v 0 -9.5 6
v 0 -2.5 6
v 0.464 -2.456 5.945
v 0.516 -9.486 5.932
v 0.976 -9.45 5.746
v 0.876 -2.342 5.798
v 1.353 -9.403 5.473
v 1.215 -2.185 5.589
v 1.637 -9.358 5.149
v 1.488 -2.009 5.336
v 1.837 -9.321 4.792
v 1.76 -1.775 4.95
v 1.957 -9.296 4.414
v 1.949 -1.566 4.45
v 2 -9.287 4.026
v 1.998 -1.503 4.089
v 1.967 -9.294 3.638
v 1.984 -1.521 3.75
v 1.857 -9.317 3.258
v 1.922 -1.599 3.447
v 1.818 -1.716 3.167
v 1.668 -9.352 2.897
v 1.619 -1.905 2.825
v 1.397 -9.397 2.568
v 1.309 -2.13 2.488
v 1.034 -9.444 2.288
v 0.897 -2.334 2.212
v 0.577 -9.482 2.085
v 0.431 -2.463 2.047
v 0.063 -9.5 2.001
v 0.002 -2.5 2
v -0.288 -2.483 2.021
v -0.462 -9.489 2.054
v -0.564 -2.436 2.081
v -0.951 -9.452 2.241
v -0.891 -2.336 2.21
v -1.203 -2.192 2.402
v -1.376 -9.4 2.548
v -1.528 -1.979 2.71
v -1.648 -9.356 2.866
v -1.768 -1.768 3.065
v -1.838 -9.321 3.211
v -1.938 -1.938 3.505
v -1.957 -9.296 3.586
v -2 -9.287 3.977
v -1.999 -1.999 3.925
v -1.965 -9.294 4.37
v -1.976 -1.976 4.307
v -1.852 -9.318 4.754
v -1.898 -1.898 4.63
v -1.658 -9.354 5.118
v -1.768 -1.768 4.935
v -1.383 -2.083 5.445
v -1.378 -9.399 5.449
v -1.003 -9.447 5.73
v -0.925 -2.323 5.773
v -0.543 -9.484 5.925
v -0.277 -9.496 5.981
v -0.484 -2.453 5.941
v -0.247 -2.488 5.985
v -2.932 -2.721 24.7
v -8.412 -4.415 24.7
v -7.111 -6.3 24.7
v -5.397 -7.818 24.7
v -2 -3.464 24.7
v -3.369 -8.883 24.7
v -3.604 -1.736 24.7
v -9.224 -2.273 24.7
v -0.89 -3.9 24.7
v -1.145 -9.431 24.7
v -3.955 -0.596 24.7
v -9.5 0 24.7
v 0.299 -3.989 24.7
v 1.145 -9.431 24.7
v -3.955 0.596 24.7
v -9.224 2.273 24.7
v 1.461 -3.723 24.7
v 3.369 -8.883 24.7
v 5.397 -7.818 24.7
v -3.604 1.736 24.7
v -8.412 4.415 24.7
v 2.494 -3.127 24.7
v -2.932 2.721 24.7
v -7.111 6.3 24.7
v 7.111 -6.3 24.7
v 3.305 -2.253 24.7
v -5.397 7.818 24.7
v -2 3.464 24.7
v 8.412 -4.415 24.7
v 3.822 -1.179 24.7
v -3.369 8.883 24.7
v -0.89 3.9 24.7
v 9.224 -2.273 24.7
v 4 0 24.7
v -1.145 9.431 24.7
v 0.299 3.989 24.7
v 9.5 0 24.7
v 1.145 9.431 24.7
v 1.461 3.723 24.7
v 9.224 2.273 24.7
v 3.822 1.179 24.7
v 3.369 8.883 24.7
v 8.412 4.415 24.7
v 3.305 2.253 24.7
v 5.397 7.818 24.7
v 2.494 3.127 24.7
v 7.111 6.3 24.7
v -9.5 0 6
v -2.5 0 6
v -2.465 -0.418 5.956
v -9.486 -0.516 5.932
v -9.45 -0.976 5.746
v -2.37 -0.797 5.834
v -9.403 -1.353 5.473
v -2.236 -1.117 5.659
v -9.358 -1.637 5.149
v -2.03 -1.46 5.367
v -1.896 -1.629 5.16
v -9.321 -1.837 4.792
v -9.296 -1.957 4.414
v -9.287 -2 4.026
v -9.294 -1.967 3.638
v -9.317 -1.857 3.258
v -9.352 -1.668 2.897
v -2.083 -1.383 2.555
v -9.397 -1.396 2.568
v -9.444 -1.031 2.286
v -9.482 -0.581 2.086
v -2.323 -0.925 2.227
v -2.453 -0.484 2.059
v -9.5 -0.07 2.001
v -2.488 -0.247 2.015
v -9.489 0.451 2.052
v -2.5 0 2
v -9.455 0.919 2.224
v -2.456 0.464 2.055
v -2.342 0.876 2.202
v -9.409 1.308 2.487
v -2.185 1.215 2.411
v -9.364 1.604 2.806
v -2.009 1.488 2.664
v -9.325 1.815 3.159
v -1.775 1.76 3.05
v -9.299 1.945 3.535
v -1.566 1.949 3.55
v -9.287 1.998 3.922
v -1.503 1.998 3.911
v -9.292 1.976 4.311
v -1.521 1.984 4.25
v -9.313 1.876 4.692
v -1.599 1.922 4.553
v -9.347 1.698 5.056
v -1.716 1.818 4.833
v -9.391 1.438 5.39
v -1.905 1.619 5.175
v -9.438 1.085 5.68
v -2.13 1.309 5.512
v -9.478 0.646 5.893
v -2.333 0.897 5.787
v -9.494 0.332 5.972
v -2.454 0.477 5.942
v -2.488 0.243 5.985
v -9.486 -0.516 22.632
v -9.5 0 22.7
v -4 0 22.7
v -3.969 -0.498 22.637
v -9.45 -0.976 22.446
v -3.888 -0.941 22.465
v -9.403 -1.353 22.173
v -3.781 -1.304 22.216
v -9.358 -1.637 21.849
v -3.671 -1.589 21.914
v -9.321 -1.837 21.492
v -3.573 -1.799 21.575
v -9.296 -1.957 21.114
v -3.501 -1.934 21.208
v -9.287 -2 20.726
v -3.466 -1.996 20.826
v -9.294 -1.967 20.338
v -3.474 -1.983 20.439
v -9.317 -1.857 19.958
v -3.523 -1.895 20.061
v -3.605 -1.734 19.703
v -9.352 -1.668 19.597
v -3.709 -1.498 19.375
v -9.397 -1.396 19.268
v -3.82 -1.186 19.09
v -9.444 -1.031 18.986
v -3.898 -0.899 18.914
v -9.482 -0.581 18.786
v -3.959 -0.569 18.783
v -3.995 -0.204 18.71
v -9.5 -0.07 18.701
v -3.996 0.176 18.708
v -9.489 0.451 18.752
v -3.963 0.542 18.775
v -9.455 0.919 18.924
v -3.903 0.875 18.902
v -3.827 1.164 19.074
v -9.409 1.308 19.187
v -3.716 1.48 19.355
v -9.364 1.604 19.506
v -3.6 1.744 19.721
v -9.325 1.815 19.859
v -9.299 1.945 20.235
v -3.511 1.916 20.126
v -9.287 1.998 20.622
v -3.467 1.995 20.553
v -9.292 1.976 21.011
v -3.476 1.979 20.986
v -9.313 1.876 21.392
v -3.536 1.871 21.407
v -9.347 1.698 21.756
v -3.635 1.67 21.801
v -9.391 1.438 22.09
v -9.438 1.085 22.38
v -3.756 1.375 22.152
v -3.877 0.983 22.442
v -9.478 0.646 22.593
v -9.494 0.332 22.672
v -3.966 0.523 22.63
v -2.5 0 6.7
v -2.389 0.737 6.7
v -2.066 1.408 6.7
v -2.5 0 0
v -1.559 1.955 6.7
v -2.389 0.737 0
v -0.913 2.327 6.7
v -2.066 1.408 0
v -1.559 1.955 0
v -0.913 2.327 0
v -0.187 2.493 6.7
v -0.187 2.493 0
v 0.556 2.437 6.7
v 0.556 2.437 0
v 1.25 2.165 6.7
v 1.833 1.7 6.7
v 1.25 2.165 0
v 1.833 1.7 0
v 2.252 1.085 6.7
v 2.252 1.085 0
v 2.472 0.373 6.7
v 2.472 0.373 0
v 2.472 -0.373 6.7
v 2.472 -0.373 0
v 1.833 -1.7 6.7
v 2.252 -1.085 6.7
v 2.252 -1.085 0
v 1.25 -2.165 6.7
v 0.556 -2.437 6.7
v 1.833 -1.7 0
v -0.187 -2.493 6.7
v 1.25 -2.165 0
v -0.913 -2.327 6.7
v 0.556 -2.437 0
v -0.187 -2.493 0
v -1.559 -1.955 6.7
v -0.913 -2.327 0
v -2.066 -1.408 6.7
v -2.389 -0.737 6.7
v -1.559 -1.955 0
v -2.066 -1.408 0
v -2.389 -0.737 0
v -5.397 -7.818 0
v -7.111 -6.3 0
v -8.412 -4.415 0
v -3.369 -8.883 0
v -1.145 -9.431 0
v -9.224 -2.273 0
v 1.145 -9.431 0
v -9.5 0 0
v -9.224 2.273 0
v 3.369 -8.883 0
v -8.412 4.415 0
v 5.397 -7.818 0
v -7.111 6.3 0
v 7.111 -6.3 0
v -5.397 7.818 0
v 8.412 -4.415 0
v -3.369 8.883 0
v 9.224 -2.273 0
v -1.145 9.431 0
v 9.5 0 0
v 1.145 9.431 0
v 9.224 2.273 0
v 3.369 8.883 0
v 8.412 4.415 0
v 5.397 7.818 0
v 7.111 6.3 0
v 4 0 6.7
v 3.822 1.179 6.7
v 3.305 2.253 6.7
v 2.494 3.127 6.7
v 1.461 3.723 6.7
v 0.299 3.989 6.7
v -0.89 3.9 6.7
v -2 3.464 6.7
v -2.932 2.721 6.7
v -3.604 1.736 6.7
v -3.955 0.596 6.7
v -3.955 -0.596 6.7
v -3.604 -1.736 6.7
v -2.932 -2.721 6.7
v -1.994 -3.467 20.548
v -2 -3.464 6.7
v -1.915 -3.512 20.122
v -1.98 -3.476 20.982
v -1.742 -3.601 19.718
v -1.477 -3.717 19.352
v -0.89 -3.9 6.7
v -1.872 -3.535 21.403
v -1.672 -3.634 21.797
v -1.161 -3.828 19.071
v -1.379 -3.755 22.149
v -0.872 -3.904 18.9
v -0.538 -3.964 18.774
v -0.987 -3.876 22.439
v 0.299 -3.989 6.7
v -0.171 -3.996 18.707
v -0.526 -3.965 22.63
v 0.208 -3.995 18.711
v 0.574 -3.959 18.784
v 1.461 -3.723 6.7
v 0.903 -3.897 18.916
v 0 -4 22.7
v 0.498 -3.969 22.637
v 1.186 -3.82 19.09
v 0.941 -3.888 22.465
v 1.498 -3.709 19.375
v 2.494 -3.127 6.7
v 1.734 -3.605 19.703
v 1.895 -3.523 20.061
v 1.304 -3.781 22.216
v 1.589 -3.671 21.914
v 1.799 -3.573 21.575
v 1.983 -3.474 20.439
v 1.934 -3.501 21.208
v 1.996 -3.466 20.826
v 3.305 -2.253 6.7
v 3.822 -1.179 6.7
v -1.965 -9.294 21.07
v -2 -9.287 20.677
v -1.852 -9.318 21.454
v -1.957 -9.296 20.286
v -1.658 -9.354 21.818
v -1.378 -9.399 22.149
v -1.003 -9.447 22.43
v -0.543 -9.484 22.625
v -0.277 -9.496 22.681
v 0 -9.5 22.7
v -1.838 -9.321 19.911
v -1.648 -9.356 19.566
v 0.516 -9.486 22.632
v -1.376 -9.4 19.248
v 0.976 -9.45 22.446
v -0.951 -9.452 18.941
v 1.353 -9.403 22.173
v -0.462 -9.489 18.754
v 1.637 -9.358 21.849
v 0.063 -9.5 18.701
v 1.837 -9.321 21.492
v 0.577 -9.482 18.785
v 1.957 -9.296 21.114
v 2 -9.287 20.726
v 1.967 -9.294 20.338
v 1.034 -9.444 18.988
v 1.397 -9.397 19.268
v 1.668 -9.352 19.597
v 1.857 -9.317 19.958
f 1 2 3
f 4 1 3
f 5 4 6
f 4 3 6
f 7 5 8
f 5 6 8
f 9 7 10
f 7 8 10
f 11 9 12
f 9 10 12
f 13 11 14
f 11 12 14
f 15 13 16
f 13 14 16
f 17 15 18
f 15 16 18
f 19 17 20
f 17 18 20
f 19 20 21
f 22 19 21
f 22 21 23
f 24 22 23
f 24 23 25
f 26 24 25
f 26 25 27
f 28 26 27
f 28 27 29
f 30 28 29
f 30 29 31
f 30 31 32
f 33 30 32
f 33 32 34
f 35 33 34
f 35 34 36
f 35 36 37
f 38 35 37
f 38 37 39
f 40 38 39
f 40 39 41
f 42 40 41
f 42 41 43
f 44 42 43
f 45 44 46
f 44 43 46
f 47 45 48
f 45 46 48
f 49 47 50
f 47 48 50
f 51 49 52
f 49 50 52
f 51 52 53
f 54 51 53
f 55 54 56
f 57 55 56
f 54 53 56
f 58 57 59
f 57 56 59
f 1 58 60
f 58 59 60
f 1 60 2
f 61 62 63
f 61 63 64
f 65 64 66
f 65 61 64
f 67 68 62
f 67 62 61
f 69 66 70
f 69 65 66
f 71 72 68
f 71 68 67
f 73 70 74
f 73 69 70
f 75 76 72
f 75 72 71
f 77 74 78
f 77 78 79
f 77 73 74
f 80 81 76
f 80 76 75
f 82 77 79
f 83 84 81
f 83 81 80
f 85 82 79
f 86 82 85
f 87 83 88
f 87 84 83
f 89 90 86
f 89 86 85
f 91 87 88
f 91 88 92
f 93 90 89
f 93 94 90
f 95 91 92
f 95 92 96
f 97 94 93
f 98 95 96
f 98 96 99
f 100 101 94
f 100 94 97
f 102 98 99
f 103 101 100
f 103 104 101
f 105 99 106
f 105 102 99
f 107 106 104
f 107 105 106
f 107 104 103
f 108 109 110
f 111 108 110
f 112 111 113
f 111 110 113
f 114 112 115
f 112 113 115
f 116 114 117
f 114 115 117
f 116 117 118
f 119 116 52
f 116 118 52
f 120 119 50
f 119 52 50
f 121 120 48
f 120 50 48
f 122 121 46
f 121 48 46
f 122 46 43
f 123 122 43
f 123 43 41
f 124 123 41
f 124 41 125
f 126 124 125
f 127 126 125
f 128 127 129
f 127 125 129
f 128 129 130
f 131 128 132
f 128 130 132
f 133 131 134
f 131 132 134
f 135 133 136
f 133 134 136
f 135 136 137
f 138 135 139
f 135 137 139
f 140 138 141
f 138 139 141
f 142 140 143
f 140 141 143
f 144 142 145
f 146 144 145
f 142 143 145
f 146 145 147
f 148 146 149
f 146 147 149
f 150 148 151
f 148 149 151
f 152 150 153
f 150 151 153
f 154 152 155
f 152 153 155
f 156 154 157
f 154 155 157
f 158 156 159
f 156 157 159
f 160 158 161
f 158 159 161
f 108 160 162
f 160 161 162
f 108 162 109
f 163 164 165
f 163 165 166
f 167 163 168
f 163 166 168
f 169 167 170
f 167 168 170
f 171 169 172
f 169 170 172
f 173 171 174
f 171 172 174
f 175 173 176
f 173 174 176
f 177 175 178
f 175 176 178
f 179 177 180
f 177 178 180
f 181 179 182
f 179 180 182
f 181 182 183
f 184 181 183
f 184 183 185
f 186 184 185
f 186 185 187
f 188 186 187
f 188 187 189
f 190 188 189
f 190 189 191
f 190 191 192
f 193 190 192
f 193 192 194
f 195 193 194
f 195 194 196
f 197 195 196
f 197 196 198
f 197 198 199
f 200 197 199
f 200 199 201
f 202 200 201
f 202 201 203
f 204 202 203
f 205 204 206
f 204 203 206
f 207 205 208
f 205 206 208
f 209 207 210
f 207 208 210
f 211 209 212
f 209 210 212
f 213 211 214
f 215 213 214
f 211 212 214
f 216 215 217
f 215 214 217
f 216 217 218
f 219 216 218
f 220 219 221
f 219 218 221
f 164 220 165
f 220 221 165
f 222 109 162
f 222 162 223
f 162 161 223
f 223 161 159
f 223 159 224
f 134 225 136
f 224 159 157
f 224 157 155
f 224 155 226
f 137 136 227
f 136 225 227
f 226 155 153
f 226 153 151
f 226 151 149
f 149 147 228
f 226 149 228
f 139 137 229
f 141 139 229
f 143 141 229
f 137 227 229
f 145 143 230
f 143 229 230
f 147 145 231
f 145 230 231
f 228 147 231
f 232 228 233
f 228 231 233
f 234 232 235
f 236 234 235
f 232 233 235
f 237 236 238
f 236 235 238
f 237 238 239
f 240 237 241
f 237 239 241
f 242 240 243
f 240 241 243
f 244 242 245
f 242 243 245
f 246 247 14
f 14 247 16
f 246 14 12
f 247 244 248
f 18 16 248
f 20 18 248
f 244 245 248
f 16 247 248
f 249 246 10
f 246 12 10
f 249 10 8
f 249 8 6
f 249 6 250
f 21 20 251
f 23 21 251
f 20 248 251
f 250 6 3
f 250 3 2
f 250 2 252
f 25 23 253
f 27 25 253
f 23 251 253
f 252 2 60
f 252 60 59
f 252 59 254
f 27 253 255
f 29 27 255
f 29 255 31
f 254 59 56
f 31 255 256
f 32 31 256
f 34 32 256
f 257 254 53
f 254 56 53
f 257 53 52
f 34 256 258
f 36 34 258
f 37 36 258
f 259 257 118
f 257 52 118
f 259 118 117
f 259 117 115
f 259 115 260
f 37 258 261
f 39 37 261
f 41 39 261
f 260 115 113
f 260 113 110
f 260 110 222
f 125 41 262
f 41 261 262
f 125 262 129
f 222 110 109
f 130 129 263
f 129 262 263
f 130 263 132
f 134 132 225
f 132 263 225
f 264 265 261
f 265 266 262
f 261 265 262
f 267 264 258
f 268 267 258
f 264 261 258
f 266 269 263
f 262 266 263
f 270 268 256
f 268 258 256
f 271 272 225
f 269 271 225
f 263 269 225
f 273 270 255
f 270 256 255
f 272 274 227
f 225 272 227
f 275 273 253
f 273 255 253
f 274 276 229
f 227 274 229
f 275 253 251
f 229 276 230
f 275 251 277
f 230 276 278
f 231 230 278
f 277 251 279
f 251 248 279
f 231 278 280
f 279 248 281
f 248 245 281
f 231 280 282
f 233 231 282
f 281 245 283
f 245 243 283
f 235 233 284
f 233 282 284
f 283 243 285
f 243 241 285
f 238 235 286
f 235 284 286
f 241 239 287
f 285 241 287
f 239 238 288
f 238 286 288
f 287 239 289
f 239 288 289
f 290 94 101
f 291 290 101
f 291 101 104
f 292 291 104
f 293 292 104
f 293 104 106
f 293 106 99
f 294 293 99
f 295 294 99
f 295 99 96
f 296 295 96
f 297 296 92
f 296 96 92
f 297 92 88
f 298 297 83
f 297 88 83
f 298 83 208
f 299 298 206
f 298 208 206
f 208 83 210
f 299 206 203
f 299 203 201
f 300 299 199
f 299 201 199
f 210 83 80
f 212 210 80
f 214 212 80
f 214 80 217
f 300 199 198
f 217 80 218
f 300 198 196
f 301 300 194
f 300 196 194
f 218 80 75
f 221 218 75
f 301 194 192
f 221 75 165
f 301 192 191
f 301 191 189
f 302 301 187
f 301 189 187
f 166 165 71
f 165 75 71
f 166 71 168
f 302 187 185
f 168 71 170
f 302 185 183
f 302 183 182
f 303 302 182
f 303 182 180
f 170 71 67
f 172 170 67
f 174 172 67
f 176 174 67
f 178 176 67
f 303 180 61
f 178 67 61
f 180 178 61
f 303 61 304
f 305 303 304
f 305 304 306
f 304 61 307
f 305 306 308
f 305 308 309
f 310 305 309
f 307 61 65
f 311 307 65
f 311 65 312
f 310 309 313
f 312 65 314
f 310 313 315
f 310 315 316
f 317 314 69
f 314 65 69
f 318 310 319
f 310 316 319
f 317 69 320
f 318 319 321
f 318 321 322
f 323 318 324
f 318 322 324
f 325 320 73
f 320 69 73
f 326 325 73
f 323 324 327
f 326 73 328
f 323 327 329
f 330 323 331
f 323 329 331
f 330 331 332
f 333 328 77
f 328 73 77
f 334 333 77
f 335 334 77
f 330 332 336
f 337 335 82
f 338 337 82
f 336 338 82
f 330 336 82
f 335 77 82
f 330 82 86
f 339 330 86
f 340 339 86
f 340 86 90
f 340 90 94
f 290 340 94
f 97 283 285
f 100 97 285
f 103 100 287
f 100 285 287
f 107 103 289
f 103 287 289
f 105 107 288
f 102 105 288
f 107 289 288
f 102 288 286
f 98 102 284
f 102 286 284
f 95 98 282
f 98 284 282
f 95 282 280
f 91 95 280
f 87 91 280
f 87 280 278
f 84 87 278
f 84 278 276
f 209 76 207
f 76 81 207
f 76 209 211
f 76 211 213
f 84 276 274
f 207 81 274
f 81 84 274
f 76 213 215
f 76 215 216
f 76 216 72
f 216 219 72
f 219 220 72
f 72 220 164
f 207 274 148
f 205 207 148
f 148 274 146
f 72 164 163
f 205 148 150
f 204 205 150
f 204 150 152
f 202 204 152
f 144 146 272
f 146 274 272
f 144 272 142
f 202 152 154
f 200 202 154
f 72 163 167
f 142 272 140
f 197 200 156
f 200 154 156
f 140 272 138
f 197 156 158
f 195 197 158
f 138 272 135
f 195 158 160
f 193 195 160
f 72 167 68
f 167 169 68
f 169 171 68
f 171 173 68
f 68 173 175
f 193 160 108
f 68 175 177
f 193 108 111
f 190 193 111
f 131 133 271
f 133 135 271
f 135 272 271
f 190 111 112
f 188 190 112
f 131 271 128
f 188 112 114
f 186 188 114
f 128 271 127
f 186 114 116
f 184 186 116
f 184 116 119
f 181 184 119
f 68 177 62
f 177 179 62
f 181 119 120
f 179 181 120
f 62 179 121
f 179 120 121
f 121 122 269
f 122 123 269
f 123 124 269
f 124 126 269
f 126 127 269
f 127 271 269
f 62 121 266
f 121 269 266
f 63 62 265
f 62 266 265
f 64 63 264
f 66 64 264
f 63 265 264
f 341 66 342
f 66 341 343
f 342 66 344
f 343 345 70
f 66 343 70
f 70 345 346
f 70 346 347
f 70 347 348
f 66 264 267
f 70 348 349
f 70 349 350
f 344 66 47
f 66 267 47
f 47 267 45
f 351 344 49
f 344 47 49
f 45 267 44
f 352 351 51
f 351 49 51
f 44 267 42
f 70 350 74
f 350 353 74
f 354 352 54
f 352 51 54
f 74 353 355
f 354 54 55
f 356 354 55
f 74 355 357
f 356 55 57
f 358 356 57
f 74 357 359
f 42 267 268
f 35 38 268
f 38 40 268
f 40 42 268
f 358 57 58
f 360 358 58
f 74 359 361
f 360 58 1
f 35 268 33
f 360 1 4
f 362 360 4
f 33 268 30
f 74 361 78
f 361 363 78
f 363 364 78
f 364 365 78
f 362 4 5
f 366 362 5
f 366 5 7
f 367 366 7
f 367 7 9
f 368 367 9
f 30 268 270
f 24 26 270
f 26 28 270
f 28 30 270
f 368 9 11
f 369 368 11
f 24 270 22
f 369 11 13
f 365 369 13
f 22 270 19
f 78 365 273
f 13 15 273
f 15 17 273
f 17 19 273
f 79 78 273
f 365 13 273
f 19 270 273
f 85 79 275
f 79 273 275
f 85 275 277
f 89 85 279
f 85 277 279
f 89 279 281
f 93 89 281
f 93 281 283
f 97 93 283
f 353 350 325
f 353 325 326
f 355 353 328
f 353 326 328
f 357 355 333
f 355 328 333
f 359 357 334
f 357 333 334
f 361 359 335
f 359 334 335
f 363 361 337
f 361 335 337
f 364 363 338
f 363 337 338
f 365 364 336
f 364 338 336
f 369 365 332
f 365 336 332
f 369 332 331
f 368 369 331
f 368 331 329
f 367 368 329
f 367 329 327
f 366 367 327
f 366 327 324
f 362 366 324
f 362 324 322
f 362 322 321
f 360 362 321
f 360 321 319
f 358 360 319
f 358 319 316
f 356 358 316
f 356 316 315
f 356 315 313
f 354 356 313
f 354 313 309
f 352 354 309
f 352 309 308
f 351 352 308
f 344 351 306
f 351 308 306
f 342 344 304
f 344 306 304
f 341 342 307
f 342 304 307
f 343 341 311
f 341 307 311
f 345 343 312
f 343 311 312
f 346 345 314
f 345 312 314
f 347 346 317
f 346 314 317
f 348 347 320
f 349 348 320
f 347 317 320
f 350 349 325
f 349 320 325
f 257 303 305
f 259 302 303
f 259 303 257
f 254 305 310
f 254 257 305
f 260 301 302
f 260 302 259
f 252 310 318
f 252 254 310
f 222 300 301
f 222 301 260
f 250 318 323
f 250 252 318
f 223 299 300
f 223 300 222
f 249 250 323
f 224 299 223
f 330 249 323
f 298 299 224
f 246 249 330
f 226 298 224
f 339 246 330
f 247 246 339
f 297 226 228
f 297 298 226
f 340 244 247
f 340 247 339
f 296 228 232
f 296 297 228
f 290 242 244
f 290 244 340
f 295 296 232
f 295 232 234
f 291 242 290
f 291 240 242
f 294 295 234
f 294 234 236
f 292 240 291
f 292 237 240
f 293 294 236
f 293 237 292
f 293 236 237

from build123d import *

# Parameters (mm, degrees)
ESQUISSE1_R                  = 9.5
BOSS_EXTRU_1_DEPTH           = 24.7
ESQUISSE2_R                  = 4
ENL_V_MAT_EXTRU_1_DEPTH      = 18
ESQUISSE3_R                  = 2.5
ENL_V_MAT_EXTRU_2_DEPTH      = 29.117432315
ESQUISSE4_R                  = 2
ENL_V_MAT_EXTRU_3_DEPTH      = 29.117432315
R_P_TITION_CIRCULAIRE1_COUNT = 2
R_P_TITION_CIRCULAIRE1_ANGLE = 90


with BuildPart() as part:
    # Esquisse1 → Boss.-Extru.1 (new body)
    with BuildSketch(Plane.XY):
        Circle(ESQUISSE1_R)
    extrude(amount=BOSS_EXTRU_1_DEPTH)

    # Esquisse2 → Enlèv. mat.-Extru.1 (cut)
    with BuildSketch(Plane.XY.offset(24.7)):
        Circle(ESQUISSE2_R)
    extrude(amount=-ENL_V_MAT_EXTRU_1_DEPTH, mode=Mode.SUBTRACT)

    # Esquisse3 → Enlèv. mat.-Extru.2 (cut, through all)
    with BuildSketch(Plane(origin=(0, 0, 0), x_dir=(-1, 0, 0), z_dir=(0, 0, -1))):
        Circle(ESQUISSE3_R)
    extrude(amount=-ENL_V_MAT_EXTRU_2_DEPTH, mode=Mode.SUBTRACT)

    # Esquisse4 → Enlèv. mat.-Extru.3 (cut, through all)
    with BuildSketch(Plane(origin=(0, 0, 0), x_dir=(1, 0, 0), z_dir=(0, 1, 0))):
        with Locations(Location((0, -4, 0), (0, 0, 270))):
            Circle(ESQUISSE4_R)
        with Locations(Location((0, -20.7, 0), (0, 0, 270))):
            Circle(ESQUISSE4_R)
    enl_v_mat_extru_3 = extrude(amount=-ENL_V_MAT_EXTRU_3_DEPTH, mode=Mode.SUBTRACT)

    # Répétition circulaire1: Enlèv. mat.-Extru.3 ×2 about axis
    r_p_tition_circulaire1_axis = Axis((0, 0, 6.7), (0, 0, -1))
    for i in range(1, R_P_TITION_CIRCULAIRE1_COUNT):
        add(enl_v_mat_extru_3.rotate(r_p_tition_circulaire1_axis, i * R_P_TITION_CIRCULAIRE1_ANGLE / (R_P_TITION_CIRCULAIRE1_COUNT - 1)), mode=Mode.SUBTRACT)


solid = part.part
